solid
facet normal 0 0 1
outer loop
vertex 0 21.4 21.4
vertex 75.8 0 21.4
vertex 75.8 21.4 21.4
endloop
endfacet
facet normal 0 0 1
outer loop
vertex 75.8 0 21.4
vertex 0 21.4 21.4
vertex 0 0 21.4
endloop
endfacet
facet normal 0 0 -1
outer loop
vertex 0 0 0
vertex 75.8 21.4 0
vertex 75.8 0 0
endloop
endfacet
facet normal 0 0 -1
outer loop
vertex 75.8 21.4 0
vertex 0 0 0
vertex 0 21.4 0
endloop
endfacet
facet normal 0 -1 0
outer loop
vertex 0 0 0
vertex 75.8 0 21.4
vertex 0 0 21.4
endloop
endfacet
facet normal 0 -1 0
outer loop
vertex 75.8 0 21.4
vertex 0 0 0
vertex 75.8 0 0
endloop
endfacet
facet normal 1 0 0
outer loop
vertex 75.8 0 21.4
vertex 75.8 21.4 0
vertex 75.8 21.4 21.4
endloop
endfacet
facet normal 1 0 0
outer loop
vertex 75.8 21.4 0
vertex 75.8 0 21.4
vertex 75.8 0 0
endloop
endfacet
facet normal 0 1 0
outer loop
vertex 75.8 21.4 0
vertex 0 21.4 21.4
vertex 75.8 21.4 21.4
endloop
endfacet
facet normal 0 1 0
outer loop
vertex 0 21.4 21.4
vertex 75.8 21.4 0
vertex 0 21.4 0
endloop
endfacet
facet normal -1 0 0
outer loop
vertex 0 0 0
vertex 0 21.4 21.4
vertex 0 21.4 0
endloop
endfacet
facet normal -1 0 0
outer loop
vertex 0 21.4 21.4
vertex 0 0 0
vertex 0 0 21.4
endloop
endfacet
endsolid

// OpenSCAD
// file: configurations.scad
battery_x_size = 75.8;
battery_y_size = 21.4;
battery_z_size = 21.4;
// main file
include <./configurations.scad>

/**
 * battery
 * @name battery
 * @description battery
 * @type component
 * @parent root
 */
module battery(
    center = false,
) {
    color("red")
    cube([
        battery_x_size,
        battery_y_size,
        battery_z_size
    ], center = center);
}


battery();
